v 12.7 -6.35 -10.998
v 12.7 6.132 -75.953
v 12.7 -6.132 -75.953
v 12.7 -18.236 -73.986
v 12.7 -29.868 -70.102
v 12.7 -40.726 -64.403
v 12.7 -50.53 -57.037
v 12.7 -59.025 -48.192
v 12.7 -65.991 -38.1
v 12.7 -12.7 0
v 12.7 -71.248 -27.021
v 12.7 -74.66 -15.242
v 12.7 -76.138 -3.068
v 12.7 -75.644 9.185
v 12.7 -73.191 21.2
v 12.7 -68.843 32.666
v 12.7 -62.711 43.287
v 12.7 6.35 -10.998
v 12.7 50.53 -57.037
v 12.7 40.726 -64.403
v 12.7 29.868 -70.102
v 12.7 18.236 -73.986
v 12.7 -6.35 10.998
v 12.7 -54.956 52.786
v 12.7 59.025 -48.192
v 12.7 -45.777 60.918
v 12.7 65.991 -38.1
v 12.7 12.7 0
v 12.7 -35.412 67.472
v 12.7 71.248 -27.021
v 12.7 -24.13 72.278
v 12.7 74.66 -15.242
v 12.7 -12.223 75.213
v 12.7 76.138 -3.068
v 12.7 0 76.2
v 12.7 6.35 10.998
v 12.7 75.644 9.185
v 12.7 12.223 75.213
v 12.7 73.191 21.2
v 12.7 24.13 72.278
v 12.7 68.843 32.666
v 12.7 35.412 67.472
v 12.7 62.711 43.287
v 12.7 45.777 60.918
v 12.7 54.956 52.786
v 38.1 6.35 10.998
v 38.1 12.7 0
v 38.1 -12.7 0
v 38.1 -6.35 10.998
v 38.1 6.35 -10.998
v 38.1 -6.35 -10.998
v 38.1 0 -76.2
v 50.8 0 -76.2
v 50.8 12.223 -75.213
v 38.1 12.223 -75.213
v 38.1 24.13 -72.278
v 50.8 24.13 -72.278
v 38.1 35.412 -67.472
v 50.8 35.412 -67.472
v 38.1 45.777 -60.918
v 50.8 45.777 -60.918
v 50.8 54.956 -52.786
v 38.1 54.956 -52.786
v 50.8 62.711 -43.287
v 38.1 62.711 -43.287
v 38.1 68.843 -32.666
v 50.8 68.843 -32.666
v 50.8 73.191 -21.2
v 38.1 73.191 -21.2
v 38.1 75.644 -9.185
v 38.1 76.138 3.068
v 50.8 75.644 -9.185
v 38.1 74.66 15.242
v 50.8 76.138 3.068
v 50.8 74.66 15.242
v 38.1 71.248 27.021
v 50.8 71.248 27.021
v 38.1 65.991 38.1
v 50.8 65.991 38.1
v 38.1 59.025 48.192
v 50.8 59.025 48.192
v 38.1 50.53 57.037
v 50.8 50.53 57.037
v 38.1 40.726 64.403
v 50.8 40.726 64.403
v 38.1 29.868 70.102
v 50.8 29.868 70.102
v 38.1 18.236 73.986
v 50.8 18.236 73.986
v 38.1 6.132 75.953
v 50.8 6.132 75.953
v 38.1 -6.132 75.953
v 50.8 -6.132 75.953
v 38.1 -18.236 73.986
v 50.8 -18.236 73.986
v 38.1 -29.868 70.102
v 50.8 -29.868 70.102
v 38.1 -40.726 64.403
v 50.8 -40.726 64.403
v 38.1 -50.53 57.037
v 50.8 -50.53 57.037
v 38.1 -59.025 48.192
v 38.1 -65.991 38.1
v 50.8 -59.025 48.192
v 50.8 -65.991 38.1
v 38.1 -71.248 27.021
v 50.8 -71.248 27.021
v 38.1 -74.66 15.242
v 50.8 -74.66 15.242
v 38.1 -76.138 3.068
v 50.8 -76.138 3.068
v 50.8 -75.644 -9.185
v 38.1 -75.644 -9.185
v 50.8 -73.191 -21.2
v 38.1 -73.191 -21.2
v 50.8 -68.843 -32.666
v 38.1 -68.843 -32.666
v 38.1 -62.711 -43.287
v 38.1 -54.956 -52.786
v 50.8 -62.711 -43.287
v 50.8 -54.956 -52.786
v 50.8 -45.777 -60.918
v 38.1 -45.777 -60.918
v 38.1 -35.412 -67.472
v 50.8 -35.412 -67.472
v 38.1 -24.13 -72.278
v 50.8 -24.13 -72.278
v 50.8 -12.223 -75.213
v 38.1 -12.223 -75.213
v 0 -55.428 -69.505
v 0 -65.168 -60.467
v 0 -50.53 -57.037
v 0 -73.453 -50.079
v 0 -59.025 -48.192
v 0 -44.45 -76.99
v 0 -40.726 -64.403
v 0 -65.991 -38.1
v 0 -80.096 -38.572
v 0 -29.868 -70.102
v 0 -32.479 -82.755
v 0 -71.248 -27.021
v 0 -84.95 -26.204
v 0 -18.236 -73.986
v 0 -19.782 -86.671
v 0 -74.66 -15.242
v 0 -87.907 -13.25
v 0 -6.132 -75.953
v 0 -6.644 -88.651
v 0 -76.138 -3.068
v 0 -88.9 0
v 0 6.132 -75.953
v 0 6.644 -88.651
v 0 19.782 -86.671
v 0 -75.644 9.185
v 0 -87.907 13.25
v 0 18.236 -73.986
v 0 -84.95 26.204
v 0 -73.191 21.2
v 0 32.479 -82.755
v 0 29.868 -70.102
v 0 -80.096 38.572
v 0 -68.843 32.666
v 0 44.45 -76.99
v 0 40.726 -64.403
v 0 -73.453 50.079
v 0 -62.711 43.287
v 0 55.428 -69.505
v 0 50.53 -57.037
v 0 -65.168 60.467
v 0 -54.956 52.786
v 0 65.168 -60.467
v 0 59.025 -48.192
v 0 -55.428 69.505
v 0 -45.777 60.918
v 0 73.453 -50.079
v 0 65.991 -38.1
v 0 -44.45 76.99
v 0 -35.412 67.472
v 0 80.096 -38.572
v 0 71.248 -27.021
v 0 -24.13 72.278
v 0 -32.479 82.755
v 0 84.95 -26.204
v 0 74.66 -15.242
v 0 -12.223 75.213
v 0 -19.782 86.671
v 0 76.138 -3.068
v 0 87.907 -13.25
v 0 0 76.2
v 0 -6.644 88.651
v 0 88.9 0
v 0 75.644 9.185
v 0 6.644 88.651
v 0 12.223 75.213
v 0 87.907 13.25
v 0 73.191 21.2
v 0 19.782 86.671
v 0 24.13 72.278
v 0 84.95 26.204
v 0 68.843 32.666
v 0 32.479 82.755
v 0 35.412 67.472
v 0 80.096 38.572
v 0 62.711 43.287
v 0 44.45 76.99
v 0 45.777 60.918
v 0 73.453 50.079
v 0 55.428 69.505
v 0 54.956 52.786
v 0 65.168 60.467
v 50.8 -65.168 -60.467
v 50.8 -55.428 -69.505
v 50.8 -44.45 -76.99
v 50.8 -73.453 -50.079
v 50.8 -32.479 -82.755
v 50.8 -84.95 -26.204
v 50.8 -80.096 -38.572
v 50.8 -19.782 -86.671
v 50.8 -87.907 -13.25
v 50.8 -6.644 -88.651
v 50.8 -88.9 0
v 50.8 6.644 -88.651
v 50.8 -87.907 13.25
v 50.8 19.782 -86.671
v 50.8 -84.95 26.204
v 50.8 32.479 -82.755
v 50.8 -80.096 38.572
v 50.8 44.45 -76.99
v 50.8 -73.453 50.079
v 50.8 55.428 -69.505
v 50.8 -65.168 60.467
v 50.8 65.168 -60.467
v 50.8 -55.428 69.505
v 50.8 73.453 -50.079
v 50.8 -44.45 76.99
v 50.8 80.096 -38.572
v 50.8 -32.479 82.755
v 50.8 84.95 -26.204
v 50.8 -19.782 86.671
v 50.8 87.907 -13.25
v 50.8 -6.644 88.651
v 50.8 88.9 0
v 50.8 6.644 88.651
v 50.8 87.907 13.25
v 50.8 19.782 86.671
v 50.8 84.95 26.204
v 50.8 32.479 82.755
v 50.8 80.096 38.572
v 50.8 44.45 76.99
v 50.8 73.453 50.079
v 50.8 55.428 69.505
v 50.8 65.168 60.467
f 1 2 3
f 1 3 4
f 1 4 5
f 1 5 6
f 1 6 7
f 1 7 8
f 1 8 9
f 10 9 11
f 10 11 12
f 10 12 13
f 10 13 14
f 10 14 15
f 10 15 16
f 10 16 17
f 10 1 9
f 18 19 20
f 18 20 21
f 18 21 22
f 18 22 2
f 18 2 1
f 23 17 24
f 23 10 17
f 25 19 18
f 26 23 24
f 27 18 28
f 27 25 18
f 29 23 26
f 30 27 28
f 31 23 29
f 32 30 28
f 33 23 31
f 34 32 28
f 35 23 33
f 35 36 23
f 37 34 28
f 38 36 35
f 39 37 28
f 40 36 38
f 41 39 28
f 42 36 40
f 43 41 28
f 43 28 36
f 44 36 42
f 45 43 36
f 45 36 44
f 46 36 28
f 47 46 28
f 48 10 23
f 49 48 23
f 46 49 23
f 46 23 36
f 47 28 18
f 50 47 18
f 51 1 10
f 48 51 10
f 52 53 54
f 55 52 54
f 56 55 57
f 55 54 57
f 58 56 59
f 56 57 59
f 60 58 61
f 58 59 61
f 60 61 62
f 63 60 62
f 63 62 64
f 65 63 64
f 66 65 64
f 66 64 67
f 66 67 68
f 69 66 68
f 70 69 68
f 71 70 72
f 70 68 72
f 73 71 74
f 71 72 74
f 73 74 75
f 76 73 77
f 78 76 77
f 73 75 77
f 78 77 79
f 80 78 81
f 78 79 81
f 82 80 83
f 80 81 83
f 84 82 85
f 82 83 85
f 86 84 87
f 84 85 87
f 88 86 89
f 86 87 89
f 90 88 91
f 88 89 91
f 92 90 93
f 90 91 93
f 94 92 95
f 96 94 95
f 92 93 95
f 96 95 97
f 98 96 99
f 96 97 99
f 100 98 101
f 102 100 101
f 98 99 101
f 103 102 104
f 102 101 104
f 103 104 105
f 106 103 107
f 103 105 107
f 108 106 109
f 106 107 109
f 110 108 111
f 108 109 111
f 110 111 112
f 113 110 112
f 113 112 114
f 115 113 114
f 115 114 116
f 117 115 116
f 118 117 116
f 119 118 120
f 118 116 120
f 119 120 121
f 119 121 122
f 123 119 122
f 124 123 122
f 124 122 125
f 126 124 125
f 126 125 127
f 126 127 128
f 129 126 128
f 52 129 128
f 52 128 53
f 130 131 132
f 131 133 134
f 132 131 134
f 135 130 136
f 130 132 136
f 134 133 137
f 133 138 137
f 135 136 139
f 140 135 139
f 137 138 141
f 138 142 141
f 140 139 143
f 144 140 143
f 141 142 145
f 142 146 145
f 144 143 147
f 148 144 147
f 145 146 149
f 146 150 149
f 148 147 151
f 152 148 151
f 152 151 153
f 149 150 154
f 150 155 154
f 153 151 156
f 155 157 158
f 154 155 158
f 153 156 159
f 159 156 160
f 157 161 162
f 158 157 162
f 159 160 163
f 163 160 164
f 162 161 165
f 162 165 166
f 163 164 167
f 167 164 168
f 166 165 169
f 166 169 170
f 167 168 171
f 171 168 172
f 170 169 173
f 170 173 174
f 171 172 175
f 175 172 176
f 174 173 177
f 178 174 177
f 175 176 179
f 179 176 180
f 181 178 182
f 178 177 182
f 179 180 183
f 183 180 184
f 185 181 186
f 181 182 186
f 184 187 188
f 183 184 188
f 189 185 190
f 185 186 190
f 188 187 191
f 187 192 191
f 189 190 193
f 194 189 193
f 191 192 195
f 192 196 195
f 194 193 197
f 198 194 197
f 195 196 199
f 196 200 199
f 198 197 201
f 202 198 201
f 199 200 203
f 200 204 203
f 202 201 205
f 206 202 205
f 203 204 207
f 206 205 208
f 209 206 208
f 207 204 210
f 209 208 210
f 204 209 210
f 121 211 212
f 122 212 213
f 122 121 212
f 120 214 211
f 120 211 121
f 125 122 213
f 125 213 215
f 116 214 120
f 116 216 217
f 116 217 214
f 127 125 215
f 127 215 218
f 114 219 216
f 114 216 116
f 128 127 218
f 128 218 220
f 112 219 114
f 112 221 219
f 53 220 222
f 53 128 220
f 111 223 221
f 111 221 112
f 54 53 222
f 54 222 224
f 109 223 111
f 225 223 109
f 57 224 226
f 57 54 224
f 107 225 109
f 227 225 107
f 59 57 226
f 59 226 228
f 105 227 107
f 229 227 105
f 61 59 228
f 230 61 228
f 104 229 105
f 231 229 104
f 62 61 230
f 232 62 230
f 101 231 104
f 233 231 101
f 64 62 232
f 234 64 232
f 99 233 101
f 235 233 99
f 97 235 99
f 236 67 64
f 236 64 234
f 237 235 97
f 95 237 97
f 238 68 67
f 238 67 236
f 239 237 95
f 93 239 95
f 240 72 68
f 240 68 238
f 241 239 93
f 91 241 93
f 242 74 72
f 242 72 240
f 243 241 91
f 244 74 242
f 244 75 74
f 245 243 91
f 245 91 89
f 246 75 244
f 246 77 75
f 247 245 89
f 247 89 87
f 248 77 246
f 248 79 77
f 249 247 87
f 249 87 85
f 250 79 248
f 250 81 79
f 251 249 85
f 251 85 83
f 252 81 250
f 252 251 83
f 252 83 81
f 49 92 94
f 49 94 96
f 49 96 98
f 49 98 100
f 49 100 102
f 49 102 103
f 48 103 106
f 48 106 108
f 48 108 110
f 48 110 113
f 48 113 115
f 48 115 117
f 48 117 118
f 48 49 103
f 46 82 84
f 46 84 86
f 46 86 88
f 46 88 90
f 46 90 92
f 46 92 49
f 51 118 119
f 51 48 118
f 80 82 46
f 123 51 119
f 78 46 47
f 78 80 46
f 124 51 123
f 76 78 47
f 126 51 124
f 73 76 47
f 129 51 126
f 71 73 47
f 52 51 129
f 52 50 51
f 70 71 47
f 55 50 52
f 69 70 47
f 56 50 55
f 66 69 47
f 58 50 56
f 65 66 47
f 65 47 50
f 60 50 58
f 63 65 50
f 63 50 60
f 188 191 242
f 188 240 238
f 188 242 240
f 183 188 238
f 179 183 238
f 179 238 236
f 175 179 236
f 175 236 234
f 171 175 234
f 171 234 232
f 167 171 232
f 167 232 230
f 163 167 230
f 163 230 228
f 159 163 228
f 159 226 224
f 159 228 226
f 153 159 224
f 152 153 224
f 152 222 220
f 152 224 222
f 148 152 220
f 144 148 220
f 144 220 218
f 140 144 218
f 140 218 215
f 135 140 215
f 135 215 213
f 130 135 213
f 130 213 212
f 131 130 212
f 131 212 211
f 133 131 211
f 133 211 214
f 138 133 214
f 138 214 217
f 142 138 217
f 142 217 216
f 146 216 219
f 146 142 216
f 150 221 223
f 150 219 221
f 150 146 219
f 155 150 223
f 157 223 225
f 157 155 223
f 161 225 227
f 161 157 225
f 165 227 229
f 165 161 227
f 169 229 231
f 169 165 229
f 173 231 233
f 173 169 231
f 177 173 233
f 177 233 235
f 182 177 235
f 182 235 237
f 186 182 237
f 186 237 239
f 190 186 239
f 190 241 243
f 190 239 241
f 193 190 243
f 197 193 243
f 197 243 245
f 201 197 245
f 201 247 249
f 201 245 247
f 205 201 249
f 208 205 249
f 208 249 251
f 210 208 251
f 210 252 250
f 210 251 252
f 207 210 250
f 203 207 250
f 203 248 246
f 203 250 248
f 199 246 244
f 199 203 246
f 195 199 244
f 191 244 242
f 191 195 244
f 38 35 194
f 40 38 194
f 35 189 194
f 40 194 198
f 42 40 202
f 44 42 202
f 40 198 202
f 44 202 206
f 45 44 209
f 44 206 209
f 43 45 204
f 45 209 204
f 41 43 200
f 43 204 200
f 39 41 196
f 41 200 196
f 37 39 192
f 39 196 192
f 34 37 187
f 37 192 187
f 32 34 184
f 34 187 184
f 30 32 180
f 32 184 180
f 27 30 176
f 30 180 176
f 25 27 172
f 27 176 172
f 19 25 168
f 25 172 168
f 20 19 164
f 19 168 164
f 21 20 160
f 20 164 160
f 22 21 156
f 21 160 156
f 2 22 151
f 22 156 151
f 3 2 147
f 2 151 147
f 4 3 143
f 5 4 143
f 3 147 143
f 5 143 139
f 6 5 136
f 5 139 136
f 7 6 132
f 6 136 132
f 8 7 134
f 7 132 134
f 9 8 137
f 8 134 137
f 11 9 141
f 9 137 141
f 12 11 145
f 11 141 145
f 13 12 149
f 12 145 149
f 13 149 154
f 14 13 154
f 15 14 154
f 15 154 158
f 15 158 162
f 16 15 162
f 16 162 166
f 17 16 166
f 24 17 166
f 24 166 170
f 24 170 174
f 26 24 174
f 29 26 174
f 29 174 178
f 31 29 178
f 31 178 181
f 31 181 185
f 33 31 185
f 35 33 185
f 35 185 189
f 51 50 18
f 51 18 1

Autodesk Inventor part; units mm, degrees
ref_plane "YZ Plane" through (0, 0, 0) normal (1, 0, 0) x (0, 1, 0)
ref_plane "XZ Plane" through (0, 0, 0) normal (0, 1, 0) x (-1, 0, 0)
ref_plane "XY Plane" through (0, 0, 0) normal (0, 0, 1) x (1, 0, 0)
sketch "Sketch1" plane through (0, 0, 0) normal (1, 0, 0) x (0, 1, 0)
  circle A0 centre (0, 0) radius 88.9
  dimension "d0" = 177.8
extrude "Extrusion1" add sketch "Sketch1" along normal blind 50.8
sketch "Sketch2" plane through (50.8, 0, 0) normal (1, 0, 0) x (0, 0, -1)
  circle A0 centre (0, 0) radius 88.9 projected
  circle A1 centre (0, 0) radius 76.2
  dimension "d3" = 12.7
extrude "Extrusion2" cut sketch "Sketch2" against normal blind 12.7 contours A1
sketch "Sketch4" plane through (0, 0, 0) normal (-1, 0, 0) x (0, 0, 1)
  circle A0 centre (0, 0) radius 76.2 projected
extrude "Extrusion3" cut sketch "Sketch4" against normal blind 12.7
sketch "Sketch5" plane through (38.1, 0, 0) normal (1, 0, 0) x (0, 0, -1)
  line L0 (0, 0) -> (0, 12.7)
  line L1 (0, 12.7) -> (10.9985, 6.35)
  line L2 (10.9985, 6.35) -> (10.9985, -6.35)
  line L3 (10.9985, -6.35) -> (0, -12.7)
  line L4 (0, -12.7) -> (-10.9985, -6.35)
  line L5 (-10.9985, -6.35) -> (-10.9985, 6.35)
  line L6 (-10.9985, 6.35) -> (0, 12.7)
  dimension "d8" = 12.7
extrude "Extrusion4" cut sketch "Sketch5" against normal blind 127
properties part number "WheelV1"
